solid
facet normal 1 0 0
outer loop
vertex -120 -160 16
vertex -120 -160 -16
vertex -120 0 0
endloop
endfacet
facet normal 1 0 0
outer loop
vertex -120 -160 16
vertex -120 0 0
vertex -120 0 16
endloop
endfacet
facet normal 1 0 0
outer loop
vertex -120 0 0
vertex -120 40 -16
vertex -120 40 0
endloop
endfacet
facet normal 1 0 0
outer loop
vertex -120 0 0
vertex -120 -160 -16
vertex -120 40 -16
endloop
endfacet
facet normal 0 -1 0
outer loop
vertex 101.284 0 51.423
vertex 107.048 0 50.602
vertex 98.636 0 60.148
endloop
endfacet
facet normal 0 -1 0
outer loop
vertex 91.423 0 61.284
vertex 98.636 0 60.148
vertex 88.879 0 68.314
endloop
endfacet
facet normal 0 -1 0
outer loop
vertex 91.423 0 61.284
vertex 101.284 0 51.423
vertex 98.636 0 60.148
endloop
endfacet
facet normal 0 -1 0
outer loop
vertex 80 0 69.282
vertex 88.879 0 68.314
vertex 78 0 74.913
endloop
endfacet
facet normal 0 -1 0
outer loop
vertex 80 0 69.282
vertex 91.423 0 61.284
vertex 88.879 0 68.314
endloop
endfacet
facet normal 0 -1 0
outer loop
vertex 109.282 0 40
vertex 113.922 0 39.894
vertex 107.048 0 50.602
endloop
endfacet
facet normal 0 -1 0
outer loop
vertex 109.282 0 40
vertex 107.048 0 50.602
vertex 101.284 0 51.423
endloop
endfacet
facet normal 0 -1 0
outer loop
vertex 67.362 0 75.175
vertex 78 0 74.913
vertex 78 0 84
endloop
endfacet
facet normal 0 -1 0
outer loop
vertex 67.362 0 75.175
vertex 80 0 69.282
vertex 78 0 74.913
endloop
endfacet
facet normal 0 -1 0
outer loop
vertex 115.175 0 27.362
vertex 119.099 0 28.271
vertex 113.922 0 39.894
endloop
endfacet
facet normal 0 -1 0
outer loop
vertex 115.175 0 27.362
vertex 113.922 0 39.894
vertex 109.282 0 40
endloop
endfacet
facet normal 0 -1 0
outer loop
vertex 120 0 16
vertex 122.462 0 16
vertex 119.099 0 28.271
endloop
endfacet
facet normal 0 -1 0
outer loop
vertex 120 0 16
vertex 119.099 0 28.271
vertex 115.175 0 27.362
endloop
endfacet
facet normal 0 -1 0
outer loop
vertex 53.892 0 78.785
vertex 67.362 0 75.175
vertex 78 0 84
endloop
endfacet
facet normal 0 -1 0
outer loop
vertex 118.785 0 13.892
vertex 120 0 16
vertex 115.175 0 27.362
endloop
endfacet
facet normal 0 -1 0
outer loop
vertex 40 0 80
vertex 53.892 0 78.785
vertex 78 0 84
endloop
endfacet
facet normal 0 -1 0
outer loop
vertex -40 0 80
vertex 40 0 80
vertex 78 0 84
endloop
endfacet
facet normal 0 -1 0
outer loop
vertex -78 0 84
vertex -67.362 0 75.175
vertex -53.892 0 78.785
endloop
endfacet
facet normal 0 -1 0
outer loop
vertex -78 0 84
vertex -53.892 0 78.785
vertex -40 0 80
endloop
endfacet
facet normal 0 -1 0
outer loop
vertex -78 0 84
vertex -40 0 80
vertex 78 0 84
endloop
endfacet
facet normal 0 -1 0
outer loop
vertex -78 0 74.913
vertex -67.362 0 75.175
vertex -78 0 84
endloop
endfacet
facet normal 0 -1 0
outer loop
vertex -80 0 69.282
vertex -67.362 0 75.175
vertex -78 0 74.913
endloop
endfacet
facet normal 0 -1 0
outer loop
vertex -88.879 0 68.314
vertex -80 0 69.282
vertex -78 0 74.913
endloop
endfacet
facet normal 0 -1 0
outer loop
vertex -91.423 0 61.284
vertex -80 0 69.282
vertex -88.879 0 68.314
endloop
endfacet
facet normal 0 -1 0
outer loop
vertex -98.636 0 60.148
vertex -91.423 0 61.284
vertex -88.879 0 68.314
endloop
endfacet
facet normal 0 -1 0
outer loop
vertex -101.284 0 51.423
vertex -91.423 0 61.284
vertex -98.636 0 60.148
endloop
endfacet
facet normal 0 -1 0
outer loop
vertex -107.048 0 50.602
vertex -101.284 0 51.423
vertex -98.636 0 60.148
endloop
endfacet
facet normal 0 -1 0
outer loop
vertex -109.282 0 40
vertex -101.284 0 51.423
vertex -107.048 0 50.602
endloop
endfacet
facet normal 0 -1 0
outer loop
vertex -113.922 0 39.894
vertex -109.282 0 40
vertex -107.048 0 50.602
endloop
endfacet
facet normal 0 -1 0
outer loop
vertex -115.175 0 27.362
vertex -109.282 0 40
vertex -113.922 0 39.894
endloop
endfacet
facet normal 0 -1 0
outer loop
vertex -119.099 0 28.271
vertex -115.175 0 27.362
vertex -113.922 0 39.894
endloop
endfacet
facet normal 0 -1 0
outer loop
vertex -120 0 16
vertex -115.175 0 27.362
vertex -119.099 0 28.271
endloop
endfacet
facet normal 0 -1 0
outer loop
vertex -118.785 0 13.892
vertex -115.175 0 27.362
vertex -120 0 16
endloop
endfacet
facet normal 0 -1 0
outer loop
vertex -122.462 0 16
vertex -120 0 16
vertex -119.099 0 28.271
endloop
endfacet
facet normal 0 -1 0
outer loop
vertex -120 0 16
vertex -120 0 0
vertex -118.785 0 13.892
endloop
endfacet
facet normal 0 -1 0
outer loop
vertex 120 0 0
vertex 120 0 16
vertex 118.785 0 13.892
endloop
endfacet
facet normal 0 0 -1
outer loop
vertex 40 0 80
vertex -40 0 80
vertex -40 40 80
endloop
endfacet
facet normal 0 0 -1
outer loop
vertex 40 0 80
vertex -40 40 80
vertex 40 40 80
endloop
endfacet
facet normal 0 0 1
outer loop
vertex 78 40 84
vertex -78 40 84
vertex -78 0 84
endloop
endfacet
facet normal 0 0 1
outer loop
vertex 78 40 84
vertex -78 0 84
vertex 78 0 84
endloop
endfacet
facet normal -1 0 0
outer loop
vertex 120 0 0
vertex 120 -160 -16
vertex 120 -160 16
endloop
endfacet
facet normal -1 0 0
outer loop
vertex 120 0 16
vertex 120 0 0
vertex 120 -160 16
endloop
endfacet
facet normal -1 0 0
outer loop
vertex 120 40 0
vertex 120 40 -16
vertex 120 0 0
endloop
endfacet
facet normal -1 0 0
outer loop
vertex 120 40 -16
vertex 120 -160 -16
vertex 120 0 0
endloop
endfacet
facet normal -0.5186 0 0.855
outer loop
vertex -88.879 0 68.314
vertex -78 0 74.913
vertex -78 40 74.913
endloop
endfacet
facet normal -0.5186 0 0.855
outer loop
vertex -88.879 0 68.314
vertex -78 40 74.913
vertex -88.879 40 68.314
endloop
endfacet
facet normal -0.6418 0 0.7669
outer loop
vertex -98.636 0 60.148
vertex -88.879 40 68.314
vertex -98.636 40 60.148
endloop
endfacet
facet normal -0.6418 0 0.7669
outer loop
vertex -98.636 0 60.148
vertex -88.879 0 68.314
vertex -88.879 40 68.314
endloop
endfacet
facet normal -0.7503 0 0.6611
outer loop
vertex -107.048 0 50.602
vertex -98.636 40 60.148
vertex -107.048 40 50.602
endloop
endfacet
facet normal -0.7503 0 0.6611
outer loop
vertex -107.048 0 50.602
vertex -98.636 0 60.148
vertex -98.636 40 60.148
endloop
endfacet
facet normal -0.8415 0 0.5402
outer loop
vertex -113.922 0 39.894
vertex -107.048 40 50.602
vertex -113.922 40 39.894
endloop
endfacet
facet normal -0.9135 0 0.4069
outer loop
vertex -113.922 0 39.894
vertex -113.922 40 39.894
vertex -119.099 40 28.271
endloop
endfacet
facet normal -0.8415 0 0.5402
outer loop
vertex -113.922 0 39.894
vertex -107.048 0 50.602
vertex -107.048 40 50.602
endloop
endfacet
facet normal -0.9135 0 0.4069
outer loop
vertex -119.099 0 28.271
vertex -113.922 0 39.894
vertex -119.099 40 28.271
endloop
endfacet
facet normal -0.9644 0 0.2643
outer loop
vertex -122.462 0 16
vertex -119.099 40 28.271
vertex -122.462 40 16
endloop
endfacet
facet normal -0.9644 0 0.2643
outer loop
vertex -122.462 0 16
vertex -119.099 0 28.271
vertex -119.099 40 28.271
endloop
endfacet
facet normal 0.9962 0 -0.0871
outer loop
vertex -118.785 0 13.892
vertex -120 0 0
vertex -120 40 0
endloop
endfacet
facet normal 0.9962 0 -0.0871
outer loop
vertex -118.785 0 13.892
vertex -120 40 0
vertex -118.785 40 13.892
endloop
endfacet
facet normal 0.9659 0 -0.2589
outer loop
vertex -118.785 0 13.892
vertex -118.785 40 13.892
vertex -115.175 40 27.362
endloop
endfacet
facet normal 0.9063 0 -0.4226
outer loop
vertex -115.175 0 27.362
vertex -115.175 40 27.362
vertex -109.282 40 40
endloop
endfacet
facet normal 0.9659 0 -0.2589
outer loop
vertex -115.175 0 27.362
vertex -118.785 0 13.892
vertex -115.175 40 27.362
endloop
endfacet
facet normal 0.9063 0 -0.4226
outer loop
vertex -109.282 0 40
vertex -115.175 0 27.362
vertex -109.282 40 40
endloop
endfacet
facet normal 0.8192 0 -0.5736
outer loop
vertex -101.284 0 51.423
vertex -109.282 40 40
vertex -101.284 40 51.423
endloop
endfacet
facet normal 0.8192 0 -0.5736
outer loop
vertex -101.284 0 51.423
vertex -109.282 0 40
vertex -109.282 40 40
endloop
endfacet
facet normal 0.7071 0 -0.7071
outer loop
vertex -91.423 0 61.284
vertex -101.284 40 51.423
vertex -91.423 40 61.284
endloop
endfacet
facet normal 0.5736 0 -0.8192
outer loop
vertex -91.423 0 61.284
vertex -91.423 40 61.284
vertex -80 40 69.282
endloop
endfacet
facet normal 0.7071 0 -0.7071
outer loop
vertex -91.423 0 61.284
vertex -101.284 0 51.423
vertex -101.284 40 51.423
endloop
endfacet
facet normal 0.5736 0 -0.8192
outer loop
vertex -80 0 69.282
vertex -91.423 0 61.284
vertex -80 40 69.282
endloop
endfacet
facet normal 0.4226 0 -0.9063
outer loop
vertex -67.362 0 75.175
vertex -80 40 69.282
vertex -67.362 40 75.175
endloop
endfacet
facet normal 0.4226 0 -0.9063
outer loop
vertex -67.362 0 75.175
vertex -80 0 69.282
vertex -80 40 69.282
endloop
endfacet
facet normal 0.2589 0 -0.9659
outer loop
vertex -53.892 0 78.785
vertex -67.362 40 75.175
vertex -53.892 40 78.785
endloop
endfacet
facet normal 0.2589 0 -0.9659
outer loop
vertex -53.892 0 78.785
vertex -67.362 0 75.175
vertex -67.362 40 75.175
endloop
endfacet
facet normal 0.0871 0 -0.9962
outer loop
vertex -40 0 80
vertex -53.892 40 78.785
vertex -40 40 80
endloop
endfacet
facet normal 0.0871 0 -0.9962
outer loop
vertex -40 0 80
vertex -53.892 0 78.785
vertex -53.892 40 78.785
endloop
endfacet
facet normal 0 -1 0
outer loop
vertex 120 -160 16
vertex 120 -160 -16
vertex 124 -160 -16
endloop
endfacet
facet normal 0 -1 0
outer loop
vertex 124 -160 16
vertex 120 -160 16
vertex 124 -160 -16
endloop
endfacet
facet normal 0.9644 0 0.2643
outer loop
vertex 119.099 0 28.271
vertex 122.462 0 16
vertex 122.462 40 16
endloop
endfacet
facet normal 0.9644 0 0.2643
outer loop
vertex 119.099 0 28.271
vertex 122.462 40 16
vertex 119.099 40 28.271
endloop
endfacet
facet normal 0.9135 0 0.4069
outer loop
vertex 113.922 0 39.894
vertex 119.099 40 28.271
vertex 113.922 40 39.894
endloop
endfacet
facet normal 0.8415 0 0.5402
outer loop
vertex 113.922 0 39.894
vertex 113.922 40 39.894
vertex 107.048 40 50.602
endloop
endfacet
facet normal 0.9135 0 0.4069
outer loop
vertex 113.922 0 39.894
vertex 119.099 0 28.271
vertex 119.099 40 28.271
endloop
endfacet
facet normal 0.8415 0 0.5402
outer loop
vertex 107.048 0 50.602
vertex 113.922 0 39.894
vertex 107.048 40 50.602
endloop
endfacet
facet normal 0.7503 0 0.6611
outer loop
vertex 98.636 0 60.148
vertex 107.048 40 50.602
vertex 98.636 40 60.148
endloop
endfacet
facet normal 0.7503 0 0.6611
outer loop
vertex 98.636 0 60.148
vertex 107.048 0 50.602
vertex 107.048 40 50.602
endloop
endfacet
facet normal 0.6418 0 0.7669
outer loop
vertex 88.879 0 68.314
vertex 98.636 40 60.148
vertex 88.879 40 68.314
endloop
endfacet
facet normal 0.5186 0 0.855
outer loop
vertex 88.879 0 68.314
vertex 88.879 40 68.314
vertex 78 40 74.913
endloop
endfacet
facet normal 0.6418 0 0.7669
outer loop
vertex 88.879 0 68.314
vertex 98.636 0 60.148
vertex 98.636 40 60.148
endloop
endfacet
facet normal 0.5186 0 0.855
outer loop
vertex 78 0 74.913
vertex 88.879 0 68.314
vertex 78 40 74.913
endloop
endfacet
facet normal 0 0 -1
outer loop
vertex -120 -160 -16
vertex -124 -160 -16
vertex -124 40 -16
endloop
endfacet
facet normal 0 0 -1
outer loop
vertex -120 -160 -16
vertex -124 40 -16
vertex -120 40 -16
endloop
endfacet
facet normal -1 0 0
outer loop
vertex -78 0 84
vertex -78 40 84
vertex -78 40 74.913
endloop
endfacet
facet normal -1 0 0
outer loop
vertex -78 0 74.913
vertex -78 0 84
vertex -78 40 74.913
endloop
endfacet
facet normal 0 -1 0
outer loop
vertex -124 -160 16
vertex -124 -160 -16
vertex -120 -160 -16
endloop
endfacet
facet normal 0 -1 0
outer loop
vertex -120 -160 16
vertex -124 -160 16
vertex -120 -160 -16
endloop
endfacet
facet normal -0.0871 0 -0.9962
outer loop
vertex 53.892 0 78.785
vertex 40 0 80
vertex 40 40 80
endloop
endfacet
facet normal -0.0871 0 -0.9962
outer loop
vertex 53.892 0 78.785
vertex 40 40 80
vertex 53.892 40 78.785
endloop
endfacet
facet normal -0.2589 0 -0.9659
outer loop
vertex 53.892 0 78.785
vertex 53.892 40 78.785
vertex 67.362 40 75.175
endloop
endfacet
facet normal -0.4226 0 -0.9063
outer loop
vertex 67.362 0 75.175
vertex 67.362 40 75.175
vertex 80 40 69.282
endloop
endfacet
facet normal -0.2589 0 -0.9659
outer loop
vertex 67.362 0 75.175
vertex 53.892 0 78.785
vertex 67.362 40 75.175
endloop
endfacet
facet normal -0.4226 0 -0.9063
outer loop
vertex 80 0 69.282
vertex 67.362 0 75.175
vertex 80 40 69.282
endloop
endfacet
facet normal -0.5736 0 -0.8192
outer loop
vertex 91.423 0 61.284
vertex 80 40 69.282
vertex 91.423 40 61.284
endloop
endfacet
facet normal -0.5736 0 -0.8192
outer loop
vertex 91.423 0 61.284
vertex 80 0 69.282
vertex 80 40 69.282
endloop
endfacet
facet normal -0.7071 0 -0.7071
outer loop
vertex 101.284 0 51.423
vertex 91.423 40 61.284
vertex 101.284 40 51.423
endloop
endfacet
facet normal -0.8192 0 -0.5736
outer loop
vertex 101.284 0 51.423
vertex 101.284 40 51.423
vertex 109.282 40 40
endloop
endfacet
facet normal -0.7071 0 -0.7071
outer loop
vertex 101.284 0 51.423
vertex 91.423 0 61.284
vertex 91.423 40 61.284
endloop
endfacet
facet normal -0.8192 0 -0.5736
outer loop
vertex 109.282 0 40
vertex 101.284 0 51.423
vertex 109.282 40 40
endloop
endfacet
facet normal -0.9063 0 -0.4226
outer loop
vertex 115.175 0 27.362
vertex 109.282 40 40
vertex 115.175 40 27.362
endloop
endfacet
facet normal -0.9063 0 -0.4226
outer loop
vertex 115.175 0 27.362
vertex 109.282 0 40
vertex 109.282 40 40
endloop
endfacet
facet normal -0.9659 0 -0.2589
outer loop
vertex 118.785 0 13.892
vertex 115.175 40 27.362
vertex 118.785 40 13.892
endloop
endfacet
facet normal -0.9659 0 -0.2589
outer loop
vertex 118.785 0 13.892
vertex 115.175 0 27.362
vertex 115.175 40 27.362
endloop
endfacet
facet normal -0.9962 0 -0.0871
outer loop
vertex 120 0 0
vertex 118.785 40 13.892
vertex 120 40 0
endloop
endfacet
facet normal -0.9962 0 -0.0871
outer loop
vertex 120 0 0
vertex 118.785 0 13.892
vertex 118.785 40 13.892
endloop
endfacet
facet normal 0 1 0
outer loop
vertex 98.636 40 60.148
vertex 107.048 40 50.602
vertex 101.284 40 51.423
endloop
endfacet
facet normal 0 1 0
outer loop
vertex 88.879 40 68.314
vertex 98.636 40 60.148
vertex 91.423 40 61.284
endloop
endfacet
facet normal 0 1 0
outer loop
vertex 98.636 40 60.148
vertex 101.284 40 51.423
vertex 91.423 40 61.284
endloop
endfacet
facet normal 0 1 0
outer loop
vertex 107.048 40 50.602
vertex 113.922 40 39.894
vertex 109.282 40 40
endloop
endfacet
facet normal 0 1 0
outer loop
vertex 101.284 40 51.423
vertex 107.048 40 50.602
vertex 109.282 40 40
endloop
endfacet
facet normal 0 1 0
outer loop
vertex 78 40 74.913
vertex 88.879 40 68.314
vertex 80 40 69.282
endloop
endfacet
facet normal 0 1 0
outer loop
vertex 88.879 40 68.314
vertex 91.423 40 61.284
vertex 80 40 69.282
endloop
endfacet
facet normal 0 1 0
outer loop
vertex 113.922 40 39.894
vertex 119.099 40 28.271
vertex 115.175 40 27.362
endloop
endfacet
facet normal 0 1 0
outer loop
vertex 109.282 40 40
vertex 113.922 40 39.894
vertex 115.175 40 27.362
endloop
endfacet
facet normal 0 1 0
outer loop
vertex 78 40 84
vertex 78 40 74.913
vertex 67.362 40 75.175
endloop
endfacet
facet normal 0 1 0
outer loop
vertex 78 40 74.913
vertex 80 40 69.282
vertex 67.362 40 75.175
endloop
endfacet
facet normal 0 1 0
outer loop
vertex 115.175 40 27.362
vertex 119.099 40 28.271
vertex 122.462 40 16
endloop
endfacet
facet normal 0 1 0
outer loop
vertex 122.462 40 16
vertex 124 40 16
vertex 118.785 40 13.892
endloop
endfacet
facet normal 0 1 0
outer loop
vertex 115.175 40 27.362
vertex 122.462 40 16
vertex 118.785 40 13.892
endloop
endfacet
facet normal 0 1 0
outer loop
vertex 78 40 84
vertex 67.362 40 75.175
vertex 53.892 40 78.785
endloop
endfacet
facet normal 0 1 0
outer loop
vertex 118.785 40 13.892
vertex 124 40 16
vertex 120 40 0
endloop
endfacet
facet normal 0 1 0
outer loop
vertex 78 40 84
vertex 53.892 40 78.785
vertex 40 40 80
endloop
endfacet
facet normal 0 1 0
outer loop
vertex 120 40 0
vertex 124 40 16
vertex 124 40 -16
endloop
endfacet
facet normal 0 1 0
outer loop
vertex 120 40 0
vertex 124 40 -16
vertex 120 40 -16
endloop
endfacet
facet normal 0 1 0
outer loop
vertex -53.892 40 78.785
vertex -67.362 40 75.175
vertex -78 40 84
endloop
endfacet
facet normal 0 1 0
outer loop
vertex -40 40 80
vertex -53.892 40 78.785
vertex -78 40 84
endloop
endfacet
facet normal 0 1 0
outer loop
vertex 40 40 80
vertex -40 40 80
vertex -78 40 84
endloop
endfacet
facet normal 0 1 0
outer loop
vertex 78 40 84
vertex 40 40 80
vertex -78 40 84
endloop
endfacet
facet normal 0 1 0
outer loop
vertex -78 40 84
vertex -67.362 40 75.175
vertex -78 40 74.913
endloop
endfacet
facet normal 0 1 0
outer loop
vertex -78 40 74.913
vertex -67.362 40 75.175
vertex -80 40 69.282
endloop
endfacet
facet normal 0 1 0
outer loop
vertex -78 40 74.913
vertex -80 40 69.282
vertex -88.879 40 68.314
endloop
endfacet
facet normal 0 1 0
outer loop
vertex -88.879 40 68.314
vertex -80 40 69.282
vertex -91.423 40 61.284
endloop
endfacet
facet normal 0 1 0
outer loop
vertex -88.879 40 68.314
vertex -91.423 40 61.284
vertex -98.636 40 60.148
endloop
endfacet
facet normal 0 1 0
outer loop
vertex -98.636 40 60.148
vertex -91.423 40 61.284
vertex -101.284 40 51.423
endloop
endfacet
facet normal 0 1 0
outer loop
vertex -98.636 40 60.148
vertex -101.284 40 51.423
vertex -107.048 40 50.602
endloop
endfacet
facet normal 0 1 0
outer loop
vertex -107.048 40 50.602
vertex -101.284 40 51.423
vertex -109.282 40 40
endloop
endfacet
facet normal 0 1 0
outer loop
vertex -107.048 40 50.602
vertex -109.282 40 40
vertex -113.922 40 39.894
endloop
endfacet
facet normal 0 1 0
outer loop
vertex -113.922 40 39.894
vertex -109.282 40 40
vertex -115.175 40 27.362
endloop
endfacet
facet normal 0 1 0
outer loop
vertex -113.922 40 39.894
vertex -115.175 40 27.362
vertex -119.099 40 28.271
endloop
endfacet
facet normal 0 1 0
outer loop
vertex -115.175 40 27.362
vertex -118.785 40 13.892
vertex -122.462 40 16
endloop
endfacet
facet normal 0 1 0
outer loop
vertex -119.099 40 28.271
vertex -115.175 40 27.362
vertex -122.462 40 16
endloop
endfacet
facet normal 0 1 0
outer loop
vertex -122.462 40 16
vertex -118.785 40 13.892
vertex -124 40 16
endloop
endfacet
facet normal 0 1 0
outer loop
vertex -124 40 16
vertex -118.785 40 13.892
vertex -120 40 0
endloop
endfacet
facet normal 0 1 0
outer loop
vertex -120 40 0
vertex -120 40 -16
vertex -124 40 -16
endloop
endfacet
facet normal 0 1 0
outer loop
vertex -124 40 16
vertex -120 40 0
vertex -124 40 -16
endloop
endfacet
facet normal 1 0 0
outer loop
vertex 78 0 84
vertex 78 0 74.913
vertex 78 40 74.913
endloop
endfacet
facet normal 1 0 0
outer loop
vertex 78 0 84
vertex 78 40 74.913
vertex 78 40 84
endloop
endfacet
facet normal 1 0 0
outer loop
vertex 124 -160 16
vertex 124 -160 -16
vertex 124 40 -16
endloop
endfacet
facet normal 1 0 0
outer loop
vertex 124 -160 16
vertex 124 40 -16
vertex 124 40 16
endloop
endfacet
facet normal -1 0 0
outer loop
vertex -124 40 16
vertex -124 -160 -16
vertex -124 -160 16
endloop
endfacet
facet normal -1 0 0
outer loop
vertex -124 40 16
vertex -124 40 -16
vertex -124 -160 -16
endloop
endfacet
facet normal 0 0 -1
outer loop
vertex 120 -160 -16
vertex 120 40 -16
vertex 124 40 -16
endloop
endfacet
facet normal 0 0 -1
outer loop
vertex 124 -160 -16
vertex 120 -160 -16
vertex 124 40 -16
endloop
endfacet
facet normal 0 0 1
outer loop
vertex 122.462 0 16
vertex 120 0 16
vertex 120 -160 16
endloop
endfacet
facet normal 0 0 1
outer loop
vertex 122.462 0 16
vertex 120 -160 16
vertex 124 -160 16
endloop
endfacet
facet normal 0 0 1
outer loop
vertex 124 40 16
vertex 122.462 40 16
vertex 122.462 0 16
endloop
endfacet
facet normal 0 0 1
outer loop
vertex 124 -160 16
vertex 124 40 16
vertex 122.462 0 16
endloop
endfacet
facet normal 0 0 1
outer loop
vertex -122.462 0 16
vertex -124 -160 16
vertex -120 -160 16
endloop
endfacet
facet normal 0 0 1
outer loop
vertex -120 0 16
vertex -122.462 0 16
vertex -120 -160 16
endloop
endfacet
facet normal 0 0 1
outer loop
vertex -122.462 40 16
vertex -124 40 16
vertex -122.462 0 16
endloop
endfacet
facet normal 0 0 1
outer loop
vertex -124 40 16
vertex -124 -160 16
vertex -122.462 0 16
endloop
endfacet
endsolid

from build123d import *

# Parameters (mm, degrees)
EXTRUDE_1_DEPTH = 40
SKETCH_3_W      = 4
SKETCH_3_H      = 32
EXTRUDE_2_DEPTH = 160
EXTRUDE_3_DEPTH = 40


with BuildPart() as part:
    # 草图2 → 凸台-拉伸1 (new body)
    with BuildSketch(Plane(origin=(0, 0, 0), x_dir=(1, 0, 0), z_dir=(0, 1, 0))):
        with BuildLine():
            Line((-40, -80), (40, -80))
            ThreePointArc((40, -80), (96.568542495, -56.568542495), (120, 0))
            Line((120, 0), (120, 16))
            Line((120, 16), (124, 16))
            Line((124, 16), (124, -16))
            Line((124, -16), (122.462112512, -16))
            ThreePointArc((122.462112512, -16), (93.441556864, -64.807406984), (40, -84))
            Line((40, -84), (-40, -84))
            ThreePointArc((-40, -84), (-93.441556864, -64.807406984), (-122.462112512, -16))
            Line((-122.462112512, -16), (-124, -16))
            Line((-124, -16), (-124, 16))
            Line((-124, 16), (-120, 16))
            Line((-120, 16), (-120, 0))
            ThreePointArc((-120, 0), (-96.568542495, -56.568542495), (-40, -80))
        make_face()
    extrude(amount=EXTRUDE_1_DEPTH)

    # 草图3 → 凸台-拉伸2 (add)
    with BuildSketch(Plane.XZ):
        with Locations((-122, 0)):
            Rectangle(SKETCH_3_W, SKETCH_3_H)
        with Locations((122, 0)):
            Rectangle(SKETCH_3_W, SKETCH_3_H)
    extrude(amount=EXTRUDE_2_DEPTH)

    # 草图5 → 凸台-拉伸3 (add)
    with BuildSketch(Plane(origin=(0, 40, 0), x_dir=(1, 0, 0), z_dir=(0, 1, 0))):
        Polygon((-40, -84), (-78, -84), (-78, -74.913283201), (-55.5334574, -80.946187921), (52.897278528, -80.946187921), (78, -72.607731722), (78, -84), (40, -84), align=None)
    extrude(amount=-EXTRUDE_3_DEPTH)


solid = part.part
